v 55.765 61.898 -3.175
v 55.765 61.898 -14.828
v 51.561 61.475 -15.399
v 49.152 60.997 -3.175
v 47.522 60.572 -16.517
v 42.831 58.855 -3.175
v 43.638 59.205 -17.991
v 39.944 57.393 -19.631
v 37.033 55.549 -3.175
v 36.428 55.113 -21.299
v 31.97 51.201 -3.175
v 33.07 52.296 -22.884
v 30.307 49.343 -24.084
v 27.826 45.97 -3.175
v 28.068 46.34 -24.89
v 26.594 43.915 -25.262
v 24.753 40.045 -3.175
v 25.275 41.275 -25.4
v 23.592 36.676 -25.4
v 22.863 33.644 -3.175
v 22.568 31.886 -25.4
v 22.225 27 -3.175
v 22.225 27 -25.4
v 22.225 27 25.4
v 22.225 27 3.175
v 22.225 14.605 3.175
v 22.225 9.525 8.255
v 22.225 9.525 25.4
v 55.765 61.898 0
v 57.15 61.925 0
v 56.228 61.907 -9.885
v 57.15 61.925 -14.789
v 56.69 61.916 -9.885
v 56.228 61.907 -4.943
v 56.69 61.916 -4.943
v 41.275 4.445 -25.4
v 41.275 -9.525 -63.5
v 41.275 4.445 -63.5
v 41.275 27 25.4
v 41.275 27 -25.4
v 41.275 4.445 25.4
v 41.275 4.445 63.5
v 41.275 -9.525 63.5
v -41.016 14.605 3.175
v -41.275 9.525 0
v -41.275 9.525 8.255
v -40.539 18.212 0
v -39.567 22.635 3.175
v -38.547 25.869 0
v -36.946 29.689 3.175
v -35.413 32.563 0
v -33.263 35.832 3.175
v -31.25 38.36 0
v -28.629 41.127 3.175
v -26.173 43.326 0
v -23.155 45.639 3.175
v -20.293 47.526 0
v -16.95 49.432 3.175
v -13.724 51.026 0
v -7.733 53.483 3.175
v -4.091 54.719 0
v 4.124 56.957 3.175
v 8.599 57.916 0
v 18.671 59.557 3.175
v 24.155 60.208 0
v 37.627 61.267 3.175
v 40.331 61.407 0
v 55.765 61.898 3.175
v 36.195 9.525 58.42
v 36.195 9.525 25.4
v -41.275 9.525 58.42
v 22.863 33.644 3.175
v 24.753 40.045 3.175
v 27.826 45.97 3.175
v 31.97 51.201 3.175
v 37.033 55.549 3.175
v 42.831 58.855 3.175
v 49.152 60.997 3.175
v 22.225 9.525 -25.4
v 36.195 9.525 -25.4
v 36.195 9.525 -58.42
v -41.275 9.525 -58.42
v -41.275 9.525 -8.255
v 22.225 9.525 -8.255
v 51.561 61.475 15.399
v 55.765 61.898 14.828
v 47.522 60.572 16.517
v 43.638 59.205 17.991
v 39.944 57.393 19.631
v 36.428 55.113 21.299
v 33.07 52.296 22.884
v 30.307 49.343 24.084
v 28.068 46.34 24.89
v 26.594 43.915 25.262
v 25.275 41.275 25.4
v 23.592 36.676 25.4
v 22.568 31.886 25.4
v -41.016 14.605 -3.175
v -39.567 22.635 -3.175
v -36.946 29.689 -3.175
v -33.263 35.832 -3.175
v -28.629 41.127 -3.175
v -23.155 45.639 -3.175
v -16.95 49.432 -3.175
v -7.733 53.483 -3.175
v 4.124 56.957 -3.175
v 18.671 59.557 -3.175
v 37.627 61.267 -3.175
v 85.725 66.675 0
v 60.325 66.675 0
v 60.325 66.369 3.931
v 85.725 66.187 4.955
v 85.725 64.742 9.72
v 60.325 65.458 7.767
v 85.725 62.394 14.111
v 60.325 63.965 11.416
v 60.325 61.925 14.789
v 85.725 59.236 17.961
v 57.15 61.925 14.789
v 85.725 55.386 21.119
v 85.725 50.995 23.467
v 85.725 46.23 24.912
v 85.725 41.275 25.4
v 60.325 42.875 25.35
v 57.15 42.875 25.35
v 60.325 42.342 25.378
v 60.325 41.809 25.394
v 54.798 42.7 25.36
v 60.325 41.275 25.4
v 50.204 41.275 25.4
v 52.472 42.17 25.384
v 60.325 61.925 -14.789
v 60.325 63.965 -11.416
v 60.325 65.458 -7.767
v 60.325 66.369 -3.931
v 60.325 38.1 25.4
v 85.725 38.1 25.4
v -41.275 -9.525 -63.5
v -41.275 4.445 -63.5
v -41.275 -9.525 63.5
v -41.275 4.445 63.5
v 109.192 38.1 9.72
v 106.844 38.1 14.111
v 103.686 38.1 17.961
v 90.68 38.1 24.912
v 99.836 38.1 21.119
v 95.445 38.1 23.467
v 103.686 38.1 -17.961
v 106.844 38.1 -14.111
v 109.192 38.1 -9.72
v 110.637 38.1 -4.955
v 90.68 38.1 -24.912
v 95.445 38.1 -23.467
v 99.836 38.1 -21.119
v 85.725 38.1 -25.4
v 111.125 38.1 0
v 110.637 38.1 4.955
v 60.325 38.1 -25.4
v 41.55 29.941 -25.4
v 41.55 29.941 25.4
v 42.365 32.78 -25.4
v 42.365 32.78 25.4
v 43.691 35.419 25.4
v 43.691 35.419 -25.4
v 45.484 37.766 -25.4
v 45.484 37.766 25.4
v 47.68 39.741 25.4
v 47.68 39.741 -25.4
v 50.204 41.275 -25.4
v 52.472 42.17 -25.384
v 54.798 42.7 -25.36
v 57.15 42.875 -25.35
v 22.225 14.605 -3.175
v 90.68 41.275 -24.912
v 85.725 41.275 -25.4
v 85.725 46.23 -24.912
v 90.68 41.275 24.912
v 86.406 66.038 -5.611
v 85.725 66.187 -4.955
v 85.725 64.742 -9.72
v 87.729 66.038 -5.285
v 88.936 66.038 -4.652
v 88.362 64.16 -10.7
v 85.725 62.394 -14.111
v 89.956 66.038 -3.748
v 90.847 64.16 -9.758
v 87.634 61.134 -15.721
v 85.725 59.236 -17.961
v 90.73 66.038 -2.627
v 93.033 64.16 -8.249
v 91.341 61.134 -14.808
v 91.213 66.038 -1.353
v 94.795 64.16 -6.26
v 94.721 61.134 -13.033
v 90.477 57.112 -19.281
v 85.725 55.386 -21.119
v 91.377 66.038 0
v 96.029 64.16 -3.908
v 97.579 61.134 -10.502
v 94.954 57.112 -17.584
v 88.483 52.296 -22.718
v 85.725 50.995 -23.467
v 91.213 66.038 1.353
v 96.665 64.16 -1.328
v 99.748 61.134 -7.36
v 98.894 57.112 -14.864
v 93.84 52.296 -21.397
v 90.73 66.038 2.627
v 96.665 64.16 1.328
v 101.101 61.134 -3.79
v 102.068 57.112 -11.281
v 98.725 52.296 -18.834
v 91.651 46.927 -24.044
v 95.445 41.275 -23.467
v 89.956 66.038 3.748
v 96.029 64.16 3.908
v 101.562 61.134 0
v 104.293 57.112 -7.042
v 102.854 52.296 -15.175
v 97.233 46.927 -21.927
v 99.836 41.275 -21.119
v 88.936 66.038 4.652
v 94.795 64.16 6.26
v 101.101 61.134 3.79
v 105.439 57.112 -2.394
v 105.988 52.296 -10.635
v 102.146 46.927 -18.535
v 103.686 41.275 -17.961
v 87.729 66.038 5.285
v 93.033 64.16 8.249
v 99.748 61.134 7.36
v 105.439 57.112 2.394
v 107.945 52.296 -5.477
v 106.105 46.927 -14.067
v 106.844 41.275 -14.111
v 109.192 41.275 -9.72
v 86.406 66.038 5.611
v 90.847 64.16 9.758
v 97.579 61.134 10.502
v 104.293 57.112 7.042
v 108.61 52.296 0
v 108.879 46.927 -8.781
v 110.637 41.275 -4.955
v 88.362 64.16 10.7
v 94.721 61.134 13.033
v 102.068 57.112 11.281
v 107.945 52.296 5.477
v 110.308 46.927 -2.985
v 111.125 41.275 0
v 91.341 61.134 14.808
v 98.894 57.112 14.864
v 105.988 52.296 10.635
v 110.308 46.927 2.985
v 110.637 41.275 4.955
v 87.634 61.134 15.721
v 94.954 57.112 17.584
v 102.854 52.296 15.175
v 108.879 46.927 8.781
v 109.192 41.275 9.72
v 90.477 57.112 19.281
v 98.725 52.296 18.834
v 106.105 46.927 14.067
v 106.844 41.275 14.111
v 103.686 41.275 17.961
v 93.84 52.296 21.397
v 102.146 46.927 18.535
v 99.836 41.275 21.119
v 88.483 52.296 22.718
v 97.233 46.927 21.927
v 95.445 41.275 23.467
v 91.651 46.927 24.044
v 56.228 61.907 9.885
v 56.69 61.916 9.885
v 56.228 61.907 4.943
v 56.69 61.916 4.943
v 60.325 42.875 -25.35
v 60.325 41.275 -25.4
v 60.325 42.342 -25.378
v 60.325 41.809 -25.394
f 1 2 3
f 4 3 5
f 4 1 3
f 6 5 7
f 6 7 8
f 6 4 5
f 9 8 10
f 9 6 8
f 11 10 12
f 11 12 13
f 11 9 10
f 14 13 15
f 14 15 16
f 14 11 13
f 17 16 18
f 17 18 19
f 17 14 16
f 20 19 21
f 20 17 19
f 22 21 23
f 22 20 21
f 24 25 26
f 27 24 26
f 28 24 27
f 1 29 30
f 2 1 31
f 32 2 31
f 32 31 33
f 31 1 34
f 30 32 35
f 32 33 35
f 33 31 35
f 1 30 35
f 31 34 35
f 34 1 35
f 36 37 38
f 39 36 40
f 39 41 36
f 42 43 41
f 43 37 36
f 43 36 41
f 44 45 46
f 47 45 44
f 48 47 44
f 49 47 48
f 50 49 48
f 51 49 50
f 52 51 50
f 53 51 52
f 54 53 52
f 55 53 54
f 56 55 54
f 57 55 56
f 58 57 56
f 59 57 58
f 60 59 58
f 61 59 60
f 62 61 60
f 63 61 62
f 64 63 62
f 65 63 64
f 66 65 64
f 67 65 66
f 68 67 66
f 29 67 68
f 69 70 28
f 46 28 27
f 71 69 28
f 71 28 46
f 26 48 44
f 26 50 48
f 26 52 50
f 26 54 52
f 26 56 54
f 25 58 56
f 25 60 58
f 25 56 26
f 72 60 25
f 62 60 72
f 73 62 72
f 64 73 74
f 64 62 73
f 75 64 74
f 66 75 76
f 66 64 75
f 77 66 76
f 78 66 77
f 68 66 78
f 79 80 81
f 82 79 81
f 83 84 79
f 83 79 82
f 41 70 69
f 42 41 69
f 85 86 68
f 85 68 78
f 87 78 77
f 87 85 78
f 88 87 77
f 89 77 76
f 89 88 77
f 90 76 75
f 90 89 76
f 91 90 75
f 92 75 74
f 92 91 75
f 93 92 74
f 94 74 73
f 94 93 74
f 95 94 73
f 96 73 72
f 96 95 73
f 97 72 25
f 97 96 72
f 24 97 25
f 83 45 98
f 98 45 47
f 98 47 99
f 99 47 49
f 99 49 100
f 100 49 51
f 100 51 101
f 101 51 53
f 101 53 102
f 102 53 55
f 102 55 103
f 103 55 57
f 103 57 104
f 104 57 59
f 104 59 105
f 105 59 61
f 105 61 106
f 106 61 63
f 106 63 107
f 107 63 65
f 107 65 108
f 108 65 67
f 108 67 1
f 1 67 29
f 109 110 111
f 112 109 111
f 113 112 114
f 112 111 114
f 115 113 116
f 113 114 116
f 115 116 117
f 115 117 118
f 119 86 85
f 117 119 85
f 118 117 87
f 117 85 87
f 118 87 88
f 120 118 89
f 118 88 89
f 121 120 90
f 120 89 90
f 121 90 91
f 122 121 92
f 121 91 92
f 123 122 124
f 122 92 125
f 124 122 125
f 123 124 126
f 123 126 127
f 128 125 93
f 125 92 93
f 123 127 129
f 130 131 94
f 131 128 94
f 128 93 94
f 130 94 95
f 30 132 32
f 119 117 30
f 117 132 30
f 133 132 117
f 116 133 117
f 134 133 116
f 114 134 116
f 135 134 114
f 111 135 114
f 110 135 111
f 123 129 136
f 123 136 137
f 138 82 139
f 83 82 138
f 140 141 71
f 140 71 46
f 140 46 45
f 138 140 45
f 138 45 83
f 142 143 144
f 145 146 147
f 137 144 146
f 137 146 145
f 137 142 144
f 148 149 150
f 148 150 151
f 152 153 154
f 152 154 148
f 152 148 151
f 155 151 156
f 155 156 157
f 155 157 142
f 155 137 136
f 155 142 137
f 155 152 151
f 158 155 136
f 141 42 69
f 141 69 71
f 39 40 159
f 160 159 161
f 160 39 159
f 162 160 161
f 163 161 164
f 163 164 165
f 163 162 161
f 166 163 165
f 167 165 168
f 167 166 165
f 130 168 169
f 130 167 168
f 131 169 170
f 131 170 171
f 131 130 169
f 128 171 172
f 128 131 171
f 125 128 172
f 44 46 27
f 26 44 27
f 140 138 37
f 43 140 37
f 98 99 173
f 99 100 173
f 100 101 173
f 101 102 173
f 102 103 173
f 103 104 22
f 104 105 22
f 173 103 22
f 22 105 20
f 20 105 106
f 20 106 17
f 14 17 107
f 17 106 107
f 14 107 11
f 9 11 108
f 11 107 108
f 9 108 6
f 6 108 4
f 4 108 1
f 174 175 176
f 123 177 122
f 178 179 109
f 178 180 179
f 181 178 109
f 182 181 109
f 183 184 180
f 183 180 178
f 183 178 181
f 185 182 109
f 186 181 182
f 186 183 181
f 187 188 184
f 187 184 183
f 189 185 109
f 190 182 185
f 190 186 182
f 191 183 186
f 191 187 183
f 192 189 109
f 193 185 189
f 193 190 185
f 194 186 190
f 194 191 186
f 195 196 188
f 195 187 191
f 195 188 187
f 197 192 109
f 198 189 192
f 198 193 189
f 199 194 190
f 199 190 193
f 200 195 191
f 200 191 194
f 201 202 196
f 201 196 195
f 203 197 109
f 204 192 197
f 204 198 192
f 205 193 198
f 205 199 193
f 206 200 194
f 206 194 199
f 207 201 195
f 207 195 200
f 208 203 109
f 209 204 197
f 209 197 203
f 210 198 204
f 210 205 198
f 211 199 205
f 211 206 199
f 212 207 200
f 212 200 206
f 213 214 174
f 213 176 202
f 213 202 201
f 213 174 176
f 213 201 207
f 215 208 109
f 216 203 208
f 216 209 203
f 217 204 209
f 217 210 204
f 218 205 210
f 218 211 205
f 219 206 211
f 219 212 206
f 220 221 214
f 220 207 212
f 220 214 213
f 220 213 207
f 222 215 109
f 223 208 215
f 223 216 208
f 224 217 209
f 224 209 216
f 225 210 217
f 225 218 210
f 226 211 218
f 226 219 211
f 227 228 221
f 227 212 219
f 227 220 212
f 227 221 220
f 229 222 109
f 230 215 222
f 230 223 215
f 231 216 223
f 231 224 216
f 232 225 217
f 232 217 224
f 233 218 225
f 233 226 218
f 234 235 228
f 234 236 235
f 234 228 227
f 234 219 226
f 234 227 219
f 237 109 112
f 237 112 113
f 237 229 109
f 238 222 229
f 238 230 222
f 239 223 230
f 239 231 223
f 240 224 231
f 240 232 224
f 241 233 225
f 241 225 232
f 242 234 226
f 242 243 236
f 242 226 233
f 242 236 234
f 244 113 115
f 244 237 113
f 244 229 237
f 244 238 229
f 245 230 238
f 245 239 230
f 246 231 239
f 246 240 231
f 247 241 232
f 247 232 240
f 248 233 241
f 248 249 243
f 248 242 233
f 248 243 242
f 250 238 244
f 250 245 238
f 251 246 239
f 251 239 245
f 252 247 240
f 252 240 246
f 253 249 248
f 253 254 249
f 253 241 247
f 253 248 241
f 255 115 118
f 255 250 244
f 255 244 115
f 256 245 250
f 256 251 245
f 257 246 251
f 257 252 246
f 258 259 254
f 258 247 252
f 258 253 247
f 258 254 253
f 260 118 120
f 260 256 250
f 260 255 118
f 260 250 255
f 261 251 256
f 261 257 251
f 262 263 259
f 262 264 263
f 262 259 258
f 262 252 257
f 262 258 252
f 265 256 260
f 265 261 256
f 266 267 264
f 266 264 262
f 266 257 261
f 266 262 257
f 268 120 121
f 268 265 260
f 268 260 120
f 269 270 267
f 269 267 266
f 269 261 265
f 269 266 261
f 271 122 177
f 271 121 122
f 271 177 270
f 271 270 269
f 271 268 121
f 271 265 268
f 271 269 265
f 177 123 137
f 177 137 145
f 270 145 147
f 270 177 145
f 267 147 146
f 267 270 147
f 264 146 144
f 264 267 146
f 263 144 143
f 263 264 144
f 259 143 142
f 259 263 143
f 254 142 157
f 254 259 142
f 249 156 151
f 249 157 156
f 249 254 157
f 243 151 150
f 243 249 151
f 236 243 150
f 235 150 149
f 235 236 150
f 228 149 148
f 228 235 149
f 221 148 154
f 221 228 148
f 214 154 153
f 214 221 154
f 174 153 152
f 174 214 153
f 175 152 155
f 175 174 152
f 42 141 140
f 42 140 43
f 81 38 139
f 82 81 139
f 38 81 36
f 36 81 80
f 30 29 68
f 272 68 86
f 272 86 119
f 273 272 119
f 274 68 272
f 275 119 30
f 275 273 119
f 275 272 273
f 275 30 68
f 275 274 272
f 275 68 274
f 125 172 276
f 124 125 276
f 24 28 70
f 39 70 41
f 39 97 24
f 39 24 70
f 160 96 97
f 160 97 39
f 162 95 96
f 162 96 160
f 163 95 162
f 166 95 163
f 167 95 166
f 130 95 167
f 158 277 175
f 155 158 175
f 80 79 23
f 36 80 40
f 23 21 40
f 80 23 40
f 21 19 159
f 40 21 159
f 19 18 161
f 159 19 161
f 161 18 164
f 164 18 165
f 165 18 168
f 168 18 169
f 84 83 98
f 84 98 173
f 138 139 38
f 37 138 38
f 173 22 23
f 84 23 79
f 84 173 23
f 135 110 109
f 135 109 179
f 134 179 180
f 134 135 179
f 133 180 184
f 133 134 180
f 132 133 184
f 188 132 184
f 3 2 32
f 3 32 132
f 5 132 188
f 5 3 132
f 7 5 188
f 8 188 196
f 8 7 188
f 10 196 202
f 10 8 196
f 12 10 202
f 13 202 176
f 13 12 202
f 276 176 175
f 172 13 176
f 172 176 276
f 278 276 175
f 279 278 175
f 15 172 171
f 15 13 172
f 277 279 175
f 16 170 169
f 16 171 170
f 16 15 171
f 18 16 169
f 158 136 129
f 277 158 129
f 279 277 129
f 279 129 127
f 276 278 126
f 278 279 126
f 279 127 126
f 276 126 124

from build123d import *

# Parameters (mm, degrees)
F1_DEPTH    = 63.5
F0_W        = 25.4
F0_H        = 19.05
F0_H_2      = 4.7752
F0_H_3      = 4.7498
F2_DEPTH    = 25.4
F3_DEPTH    = 3.175
F5_T1_DEPTH = 88.9
F5_T4_ANGLE = 180
F6_SIZE     = 5.08


# Not quite as in the source:
# - a fillet or chamfer that OpenCascade refuses, or shapes differently, is made with other operations: its cross-section is extruded or revolved along the edge and cut away or added


with BuildPart() as f1:
    # F0 (on Top) → F1 (new body, symmetric)
    with BuildSketch(Plane.XY):
        Polygon((41.275, -9.525), (41.275, 9.525), (22.225, 9.525), (-41.275, 9.525), (-41.275, -9.525), align=None)
    extrude(amount=F1_DEPTH, both=True)

    # F0 (on Top) → F2 (join, symmetric)
    with BuildSketch(Plane.XY):
        with BuildLine():
            Line((22.225, 9.525), (41.275, 9.525))
            Line((41.275, 9.525), (41.275, 27.0002))
            ThreePointArc((41.275, 27.0002), (45.9246798487, 38.2255201513), (57.15, 42.8752))
            Line((57.15, 42.8752), (60.325, 42.8752))
            Line((60.325, 42.8752), (60.325, 61.9252))
            Line((60.325, 61.9252), (57.15, 61.9252))
            add(Edge.make_bspline(
                [(55.7653482616, 61.897740953), (56.229278457, 61.90719099), (56.6908681229, 61.9163212607), (57.15, 61.9252)],
                knots=[110.2179933389, 110.2179933389, 110.2179933389, 110.2179933389, 111.5045361635, 111.5045361635, 111.5045361635, 111.5045361635], degree=3))
            ThreePointArc((55.7653482616, 61.897740953), (31.9695056943, 51.2014051666), (22.225, 27.0002))
            Line((22.225, 27.0002), (22.225, 9.525))
        make_face()
        with Locations((73.025, 52.4002)):
            Rectangle(F0_W, F0_H)
        with Locations((73.025, 40.4876)):
            Rectangle(F0_W, F0_H_2)
        with Locations((73.025, 64.3001)):
            Rectangle(F0_W, F0_H_3)
    extrude(amount=F2_DEPTH, both=True)

    # F0 (on Top) → F3 (join, symmetric)
    with BuildSketch(Plane.XY):
        with BuildLine():
            Line((-41.275, 9.525), (22.225, 9.525))
            Line((22.225, 9.525), (22.225, 27.0002))
            ThreePointArc((22.225, 27.0002), (31.9695056943, 51.2014051666), (55.7653482616, 61.897740953))
            add(Edge.make_bspline(
                [(-41.275, 9.525), (-40.9022788448, 57.9317022513), (16.0204954638, 61.0881572363), (55.7653482616, 61.897740953)],
                knots=[0, 0, 0, 0, 110.2179933389, 110.2179933389, 110.2179933389, 110.2179933389], degree=3))
        make_face()
    extrude(amount=F3_DEPTH, both=True)

    # F0 (on Top) → F4 (revolve)
    with BuildSketch(Plane.XY):
        Polygon((85.725, 61.9252), (85.725, 42.8752), (85.725, 38.1), (111.125, 38.1), (111.125, 66.675), (85.725, 66.675), align=None)
    revolve(axis=Axis((85.725, 52.3875, 0), (0, 1, 0)))

    # F5: fillet of radius 25.4 on 1 edges, made by hand

    # F5_s2 → F5_t1 (cut)
    with BuildSketch(Plane.YZ.offset(-3.175)):
        with BuildLine():
            ThreePointArc((66.675, 0), (59.2355122421, -17.9605122421), (41.275, -25.4))
            Line((41.275, -25.4), (66.675, -25.4))
            Line((66.675, -25.4), (66.675, 0))
        make_face()
        with BuildLine():
            ThreePointArc((66.675, 0), (59.2355122421, 17.9605122421), (41.275, 25.4))
            Line((41.275, 25.4), (66.675, 25.4))
            Line((66.675, 25.4), (66.675, 0))
        make_face()
    extrude(amount=F5_T1_DEPTH, mode=Mode.SUBTRACT)

    # F5_s3 → F5_t4 (revolve, cut)
    with BuildSketch(Plane.YZ.offset(85.725)):
        with BuildLine():
            ThreePointArc((66.675, 0), (59.2355122421, -17.9605122421), (41.275, -25.4))
            Line((41.275, -25.4), (66.675, -25.4))
            Line((66.675, -25.4), (66.675, 0))
        make_face()
    revolve(axis=Axis((85.725, 66.675, 0), (0, -1, 0)), revolution_arc=F5_T4_ANGLE, mode=Mode.SUBTRACT)

    # F6
    f6_edges = [f1.edges().sort_by_distance(p)[0] for p in [
        (-9.525, 9.525, 3.175),
        (-9.525, 9.525, -3.175),
        (0, 9.525, -63.5),
        (41.275, 9.525, -44.45),
        (41.275, 9.525, 44.45),
        (0, 9.525, 63.5),
    ]]
    chamfer(f6_edges, length=F6_SIZE)


solid = f1.part
